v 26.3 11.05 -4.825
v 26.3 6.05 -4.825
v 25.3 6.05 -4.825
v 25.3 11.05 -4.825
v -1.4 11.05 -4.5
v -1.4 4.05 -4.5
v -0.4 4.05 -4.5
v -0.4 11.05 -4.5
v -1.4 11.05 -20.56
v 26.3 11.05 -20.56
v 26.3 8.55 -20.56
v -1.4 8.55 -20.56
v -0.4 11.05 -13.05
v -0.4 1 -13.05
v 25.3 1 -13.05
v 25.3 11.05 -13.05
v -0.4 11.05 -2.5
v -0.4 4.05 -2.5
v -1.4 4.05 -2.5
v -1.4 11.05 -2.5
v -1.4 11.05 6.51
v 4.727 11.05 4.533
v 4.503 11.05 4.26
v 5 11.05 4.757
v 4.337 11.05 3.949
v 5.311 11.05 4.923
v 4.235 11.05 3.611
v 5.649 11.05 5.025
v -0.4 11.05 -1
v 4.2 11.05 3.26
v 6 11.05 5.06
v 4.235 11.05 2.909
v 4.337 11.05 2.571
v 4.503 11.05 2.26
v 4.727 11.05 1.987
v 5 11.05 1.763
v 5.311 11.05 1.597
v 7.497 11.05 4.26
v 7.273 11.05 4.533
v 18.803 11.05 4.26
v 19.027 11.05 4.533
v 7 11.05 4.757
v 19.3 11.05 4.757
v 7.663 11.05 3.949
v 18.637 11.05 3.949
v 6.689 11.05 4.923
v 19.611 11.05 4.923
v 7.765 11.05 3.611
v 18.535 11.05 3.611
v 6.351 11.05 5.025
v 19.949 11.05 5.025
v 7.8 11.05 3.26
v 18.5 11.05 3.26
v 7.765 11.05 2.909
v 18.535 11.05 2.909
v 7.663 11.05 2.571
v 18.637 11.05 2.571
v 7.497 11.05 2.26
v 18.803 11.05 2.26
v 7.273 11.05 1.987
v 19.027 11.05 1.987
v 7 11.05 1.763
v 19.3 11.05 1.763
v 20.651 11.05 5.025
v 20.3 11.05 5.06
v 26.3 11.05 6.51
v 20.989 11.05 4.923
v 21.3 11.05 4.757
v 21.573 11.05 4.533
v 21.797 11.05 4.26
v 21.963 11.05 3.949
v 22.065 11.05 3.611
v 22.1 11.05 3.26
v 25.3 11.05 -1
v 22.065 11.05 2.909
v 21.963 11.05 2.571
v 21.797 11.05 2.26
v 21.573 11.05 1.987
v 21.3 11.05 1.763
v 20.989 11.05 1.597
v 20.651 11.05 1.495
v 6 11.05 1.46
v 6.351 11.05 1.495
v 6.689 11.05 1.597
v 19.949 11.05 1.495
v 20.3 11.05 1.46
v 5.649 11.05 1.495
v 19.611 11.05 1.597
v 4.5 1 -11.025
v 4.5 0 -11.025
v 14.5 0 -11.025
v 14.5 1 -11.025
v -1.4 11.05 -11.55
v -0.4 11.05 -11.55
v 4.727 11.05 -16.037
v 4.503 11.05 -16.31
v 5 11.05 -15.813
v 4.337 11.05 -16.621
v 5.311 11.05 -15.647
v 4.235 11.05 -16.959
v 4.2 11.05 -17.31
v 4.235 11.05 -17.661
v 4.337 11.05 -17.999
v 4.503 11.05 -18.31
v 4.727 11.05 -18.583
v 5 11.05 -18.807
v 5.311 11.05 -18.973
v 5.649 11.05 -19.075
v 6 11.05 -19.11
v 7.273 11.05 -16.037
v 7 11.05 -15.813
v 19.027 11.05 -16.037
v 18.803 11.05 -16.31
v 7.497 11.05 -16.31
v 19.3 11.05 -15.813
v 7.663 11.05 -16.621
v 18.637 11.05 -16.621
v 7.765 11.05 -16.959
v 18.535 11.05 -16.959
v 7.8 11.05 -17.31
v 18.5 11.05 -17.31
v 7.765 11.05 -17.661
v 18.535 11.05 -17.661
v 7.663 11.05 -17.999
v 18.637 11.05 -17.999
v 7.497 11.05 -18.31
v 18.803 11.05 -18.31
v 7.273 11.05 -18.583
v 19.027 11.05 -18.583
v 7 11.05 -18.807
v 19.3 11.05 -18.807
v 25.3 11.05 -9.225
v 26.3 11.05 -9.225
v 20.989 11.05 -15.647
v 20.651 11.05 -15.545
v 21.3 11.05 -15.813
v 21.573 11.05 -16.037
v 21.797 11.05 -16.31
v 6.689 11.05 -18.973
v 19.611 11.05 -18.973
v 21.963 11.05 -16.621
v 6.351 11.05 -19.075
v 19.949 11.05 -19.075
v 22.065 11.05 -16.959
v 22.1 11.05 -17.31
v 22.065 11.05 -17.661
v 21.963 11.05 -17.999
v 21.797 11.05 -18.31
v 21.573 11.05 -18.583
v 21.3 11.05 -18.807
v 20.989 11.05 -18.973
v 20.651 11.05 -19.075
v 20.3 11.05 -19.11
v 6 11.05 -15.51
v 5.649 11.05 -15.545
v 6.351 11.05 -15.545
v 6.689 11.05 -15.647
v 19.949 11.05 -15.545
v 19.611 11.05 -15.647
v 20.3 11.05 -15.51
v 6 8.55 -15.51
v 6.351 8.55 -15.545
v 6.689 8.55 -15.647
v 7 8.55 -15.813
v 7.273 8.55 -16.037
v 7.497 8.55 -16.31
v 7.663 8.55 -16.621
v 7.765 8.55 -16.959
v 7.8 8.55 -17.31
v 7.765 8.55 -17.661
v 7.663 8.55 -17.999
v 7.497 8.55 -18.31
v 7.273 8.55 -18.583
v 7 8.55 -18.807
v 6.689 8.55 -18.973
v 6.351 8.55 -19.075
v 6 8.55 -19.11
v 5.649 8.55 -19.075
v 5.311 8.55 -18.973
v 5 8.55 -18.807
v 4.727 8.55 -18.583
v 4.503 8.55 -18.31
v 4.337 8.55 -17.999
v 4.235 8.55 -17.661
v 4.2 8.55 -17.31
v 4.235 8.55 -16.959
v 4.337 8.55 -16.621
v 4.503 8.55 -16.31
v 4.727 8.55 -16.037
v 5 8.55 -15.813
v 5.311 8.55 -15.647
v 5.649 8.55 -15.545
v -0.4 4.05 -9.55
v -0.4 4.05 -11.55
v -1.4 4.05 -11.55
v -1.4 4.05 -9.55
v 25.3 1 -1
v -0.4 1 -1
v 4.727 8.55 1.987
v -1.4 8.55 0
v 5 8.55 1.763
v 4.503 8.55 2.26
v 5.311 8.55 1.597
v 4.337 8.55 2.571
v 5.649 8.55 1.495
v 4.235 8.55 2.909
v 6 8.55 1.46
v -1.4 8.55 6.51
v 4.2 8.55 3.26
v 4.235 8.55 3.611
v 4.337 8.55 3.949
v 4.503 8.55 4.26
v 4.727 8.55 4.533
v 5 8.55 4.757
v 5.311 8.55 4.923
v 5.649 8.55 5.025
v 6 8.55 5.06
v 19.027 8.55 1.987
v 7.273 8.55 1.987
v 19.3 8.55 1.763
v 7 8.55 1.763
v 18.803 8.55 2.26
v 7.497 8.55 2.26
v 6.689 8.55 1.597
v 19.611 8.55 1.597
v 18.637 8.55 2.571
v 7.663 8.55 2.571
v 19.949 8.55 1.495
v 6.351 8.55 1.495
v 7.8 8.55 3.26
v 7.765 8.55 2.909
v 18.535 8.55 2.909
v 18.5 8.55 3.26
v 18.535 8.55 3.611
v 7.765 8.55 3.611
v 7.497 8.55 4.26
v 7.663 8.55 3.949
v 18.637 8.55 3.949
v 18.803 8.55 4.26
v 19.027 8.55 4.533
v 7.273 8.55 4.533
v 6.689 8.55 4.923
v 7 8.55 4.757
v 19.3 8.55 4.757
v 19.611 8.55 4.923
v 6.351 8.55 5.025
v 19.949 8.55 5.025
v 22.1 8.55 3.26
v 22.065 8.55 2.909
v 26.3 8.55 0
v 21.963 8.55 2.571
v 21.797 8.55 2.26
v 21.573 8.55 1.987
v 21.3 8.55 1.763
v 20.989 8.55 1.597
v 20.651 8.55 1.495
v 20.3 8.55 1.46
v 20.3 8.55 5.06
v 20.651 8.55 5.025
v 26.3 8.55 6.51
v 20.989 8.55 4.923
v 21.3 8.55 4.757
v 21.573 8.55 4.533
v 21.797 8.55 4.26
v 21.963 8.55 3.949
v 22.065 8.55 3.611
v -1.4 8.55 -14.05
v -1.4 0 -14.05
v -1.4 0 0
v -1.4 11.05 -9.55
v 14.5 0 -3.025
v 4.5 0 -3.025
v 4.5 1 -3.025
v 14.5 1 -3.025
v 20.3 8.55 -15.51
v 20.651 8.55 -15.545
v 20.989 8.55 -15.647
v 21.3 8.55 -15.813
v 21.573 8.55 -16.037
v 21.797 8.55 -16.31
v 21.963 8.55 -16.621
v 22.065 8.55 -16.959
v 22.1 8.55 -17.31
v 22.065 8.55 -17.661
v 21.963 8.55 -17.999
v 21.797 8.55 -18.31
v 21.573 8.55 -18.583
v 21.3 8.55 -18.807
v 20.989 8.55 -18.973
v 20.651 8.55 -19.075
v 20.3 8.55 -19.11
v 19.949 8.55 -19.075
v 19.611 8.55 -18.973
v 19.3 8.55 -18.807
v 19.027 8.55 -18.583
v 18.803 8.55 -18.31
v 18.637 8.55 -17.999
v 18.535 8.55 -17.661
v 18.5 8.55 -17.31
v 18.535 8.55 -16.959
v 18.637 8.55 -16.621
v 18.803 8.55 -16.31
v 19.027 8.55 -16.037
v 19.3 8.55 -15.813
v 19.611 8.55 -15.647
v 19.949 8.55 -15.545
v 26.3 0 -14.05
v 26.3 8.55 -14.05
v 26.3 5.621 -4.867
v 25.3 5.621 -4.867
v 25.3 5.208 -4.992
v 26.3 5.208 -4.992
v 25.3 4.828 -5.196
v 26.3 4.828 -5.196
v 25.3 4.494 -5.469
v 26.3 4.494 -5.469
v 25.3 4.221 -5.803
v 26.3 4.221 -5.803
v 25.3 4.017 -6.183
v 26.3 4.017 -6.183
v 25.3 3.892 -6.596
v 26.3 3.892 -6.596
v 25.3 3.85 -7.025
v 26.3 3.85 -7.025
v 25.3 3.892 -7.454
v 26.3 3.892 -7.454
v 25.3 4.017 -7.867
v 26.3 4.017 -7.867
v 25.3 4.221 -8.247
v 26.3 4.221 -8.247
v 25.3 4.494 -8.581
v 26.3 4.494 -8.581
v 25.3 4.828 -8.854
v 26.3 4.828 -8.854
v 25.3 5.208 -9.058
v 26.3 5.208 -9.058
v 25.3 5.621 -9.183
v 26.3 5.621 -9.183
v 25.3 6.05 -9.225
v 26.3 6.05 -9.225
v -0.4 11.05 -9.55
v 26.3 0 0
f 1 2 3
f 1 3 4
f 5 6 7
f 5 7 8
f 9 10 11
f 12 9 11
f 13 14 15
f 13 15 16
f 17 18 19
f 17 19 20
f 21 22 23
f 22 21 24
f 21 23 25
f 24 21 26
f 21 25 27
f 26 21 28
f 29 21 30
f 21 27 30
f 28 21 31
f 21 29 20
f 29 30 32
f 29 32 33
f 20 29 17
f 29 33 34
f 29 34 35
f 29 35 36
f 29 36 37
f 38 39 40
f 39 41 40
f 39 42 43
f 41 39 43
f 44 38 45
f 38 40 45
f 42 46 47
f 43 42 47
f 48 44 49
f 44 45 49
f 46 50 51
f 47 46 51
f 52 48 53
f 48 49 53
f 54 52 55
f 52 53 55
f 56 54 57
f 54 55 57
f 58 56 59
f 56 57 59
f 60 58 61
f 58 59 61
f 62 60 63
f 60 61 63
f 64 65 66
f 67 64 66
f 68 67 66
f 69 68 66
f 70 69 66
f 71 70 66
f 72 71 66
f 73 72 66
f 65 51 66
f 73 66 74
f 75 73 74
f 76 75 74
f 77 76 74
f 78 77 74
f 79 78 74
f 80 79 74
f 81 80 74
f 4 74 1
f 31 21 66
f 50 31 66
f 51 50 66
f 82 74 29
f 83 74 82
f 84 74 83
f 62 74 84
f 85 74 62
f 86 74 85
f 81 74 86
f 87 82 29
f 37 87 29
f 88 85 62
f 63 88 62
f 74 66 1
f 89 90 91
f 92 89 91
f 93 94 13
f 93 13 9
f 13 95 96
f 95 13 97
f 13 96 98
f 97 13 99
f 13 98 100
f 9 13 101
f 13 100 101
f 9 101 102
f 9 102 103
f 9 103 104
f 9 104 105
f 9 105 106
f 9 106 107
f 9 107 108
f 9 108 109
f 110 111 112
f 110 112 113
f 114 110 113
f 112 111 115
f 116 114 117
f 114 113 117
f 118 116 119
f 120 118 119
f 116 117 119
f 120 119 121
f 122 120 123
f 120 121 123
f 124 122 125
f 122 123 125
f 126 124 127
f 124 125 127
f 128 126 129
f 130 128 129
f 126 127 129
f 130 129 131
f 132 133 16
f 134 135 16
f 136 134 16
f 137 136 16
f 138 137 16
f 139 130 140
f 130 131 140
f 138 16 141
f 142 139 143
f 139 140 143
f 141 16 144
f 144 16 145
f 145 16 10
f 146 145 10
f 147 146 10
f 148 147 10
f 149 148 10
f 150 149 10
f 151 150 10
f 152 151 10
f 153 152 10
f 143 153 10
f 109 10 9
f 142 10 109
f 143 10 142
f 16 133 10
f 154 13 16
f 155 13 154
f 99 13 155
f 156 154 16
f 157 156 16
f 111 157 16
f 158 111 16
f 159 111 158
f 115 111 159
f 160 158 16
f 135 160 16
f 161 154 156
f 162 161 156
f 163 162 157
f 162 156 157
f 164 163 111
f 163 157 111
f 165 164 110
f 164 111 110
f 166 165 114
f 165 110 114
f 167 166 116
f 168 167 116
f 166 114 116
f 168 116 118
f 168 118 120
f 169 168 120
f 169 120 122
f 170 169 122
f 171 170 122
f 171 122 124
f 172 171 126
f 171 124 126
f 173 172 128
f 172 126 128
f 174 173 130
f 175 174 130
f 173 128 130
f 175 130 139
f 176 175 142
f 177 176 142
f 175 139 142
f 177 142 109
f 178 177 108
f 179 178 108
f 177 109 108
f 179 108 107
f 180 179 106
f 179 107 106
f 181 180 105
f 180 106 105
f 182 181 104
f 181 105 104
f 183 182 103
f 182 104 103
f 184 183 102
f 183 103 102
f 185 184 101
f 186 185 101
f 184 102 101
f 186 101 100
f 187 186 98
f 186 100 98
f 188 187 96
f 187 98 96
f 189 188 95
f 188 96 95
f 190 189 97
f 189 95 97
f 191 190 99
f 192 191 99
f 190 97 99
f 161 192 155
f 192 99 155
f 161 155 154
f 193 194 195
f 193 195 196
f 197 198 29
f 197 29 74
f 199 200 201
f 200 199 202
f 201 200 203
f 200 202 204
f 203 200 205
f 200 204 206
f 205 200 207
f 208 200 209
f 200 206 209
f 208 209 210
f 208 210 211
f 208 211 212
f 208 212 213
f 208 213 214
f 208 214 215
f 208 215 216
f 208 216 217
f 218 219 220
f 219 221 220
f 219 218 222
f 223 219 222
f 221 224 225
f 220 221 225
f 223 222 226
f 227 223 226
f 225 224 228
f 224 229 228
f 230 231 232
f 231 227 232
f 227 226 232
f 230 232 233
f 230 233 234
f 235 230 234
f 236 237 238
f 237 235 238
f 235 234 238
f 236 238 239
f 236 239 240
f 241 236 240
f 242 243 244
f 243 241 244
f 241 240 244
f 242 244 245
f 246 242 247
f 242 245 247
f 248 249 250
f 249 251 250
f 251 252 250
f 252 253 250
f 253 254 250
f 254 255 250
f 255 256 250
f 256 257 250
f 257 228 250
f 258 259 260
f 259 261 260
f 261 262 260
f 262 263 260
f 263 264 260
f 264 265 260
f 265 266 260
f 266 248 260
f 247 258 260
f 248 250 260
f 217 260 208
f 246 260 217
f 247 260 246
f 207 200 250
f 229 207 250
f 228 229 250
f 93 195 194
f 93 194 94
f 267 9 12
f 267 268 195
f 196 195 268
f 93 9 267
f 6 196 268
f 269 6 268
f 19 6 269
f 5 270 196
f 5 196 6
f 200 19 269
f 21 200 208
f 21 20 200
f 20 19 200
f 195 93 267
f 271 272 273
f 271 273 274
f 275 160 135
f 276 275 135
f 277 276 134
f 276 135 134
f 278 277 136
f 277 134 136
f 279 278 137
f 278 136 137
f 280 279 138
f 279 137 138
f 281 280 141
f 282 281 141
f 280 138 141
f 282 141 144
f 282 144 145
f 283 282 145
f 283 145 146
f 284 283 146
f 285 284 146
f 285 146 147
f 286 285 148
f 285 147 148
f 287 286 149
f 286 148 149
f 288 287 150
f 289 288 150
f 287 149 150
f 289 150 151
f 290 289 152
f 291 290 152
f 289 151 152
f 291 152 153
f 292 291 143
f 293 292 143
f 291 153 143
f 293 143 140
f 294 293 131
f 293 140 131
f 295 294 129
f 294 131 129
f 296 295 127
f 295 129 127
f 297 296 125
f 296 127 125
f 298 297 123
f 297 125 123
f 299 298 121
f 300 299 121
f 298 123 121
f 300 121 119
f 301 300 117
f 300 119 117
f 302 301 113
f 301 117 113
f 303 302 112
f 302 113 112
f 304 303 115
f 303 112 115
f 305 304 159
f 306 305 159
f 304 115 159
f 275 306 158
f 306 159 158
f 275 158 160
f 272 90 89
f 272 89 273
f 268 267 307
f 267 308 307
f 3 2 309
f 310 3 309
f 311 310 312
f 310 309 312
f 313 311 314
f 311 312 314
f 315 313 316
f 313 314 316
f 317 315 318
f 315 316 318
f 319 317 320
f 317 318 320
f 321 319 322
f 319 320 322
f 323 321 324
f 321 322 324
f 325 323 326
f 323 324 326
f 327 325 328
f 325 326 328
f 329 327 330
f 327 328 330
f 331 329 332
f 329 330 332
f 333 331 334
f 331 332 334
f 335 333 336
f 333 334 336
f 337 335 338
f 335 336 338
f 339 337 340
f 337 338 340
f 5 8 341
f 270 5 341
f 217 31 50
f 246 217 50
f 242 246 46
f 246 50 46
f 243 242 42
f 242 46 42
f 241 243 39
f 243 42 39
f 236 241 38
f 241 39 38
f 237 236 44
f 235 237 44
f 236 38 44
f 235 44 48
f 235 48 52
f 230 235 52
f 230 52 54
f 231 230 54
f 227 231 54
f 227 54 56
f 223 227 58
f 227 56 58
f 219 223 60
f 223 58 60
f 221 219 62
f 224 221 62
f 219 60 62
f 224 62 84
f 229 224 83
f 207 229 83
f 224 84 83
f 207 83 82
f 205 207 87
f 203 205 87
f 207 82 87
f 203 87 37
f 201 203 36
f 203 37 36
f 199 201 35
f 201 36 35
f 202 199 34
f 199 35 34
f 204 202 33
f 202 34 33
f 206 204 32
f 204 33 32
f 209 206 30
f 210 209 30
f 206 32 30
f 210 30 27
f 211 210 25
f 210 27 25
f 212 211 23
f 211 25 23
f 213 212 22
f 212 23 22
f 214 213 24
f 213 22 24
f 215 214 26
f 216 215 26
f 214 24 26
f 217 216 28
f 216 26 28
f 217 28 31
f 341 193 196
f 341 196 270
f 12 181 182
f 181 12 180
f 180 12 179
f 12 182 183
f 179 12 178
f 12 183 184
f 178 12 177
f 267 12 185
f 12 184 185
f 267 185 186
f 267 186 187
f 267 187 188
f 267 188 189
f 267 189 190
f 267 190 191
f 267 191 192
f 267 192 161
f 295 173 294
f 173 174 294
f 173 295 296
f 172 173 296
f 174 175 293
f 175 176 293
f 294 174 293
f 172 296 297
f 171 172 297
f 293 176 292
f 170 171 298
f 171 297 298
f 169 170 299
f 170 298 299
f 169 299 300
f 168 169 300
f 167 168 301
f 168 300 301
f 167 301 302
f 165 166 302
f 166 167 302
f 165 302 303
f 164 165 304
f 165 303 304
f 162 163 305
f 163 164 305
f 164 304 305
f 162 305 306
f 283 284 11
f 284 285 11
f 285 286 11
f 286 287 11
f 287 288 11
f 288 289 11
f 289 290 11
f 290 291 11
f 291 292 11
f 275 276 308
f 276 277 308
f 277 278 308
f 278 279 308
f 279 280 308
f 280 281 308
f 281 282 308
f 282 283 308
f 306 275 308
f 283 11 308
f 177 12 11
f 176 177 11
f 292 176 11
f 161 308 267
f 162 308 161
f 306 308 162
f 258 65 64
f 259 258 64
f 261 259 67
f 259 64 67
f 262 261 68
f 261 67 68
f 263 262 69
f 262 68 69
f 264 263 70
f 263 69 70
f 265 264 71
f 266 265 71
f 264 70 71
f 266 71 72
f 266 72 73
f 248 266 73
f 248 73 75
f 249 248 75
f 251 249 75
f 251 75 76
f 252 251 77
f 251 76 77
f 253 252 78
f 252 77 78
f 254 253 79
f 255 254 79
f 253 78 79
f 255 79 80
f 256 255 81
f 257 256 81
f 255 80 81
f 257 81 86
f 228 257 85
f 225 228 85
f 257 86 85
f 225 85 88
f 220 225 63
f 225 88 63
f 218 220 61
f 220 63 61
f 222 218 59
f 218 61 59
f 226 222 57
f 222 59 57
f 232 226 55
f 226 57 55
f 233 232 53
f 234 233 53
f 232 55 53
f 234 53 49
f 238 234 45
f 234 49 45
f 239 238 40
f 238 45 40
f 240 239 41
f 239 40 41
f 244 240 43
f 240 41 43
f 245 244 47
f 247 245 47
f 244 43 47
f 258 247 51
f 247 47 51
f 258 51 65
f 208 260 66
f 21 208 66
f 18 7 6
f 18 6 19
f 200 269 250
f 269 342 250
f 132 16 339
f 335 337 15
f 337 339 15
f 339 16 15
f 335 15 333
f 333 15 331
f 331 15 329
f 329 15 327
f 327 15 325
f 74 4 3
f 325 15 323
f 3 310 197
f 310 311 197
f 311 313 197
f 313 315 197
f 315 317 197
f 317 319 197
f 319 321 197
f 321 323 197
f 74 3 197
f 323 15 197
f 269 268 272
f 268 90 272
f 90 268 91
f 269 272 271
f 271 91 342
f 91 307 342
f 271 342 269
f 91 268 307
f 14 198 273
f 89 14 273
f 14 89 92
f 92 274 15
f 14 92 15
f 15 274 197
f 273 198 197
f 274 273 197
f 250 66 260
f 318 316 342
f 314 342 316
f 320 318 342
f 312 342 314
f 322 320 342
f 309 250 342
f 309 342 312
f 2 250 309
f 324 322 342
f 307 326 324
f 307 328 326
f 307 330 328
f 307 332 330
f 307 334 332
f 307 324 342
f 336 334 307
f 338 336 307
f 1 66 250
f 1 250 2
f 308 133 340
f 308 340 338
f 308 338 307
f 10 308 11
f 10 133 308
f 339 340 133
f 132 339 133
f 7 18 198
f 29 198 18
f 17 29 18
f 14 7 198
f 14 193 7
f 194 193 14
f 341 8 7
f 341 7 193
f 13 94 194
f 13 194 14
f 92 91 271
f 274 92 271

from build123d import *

# Parameters (mm, degrees)
SKETCH1_W            = 26.3
SKETCH1_H            = 14.05
BOSS_EXTRUDE6_DEPTH  = 1
SKETCH5_W            = 24.3
SKETCH5_H            = 1
BOSS_EXTRUDE8_DEPTH  = 10.05
SKETCH6_W            = 26.3
SKETCH6_H            = 27.07
SKETCH6_W_2          = 24.3
SKETCH6_H_2          = 12.05
BOSS_EXTRUDE9_DEPTH  = 2.5
SKETCH7_R            = 1.8
CUT_EXTRUDE1_DEPTH   = 2.5
SKETCH8_W            = 4.4
SKETCH8_H            = 5
CUT_EXTRUDE2_DEPTH   = 2.5
CUT_EXTRUDE3_DEPTH   = 2.5
SKETCH10_W           = 12
SKETCH10_H           = 8
CUT_EXTRUDE5_DEPTH   = 2.5
SKETCH11_W           = 2
SKETCH11_H           = 7
CUT_EXTRUDE7_DEPTH   = 2.5
SKETCH12_W           = 2
SKETCH12_H           = 3
BOSS_EXTRUDE11_DEPTH = 1
SKETCH13_W           = 2
SKETCH13_H           = 8
BOSS_EXTRUDE14_DEPTH = 1
SKETCH14_W           = 2
SKETCH14_H           = 4
BOSS_EXTRUDE15_DEPTH = 1.4
SKETCH15_W           = 12.05
SKETCH15_H           = 10.05
CUT_EXTRUDE8_DEPTH   = 1.4
SKETCH16_W           = 2
SKETCH16_H           = 3
CUT_EXTRUDE9_DEPTH   = 1.4


with BuildPart() as part:
    # Sketch1 → Boss-Extrude6 (new body)
    with BuildSketch(Plane(origin=(0, 0, 0), x_dir=(1, 0, 0), z_dir=(0, 1, 0))):
        with Locations((13.15, 7.025)):
            Rectangle(SKETCH1_W, SKETCH1_H)
    extrude(amount=BOSS_EXTRUDE6_DEPTH)

    # Sketch5 → Boss-Extrude8 (add)
    with BuildSketch(Plane(origin=(0, 1, 0), x_dir=(1, 0, 0), z_dir=(0, 1, 0))):
        with Locations((13.15, 13.55)):
            Rectangle(SKETCH5_W, SKETCH5_H)
        Polygon((26.3, 14.05), (25.3, 14.05), (25.3, 13.05), (25.3, 1), (25.3, 0), (26.3, 0), align=None)
        with Locations((13.15, 0.5)):
            Rectangle(SKETCH5_W, SKETCH5_H)
        Polygon((1, 14.05), (0, 14.05), (0, 0), (1, 0), (1, 1), (1, 13.05), align=None)
    extrude(amount=BOSS_EXTRUDE8_DEPTH)

    # Sketch6 → Boss-Extrude9 (add)
    with BuildSketch(Plane(origin=(0, 11.05, 0), x_dir=(1, 0, 0), z_dir=(0, 1, 0))):
        with Locations((13.15, 7.025)):
            Rectangle(SKETCH6_W, SKETCH6_H)
        with Locations((13.15, 7.025)):
            Rectangle(SKETCH6_W_2, SKETCH6_H_2, mode=Mode.SUBTRACT)
    extrude(amount=-BOSS_EXTRUDE9_DEPTH)

    # Sketch7 → Cut-Extrude1 (cut)
    with BuildSketch(Plane(origin=(0, 11.05, 0), x_dir=(1, 0, 0), z_dir=(0, 1, 0))):
        with Locations(Location((6, -3.26, 0), (0, 0, 270))):
            Circle(SKETCH7_R)
        with Locations(Location((20.3, -3.26, 0), (0, 0, 270))):
            Circle(SKETCH7_R)
        with Locations(Location((6, 17.31, 0), (0, 0, 270))):
            Circle(SKETCH7_R)
        with Locations(Location((20.3, 17.31, 0), (0, 0, 270))):
            Circle(SKETCH7_R)
    extrude(amount=-CUT_EXTRUDE1_DEPTH, mode=Mode.SUBTRACT)

    # Sketch8 → Cut-Extrude2 (cut)
    with BuildSketch(Plane(origin=(26.3, 0, 0), x_dir=(0, 0, -1), z_dir=(1, 0, 0))):
        with Locations((7.025, 8.55)):
            Rectangle(SKETCH8_W, SKETCH8_H)
    extrude(amount=-CUT_EXTRUDE2_DEPTH, mode=Mode.SUBTRACT)

    # Sketch9 → Cut-Extrude3 (cut)
    with BuildSketch(Plane(origin=(26.3, 0, 0), x_dir=(0, 0, -1), z_dir=(1, 0, 0))):
        with BuildLine():
            Line((9.225, 6.05), (4.825, 6.05))
            ThreePointArc((4.825, 6.05), (7.025, 3.85), (9.225, 6.05))
        make_face()
    extrude(amount=-CUT_EXTRUDE3_DEPTH, mode=Mode.SUBTRACT)

    # Sketch10 → Cut-Extrude5 (cut)
    with BuildSketch(Plane.XZ):
        with Locations((8.5, -7.025)):
            Rectangle(SKETCH10_W, SKETCH10_H)
    extrude(amount=-CUT_EXTRUDE5_DEPTH, mode=Mode.SUBTRACT)

    # Sketch11 → Cut-Extrude7 (cut)
    with BuildSketch(Plane.ZY):
        with Locations((-3.5, 7.55)):
            Rectangle(SKETCH11_W, SKETCH11_H)
        with Locations((-10.55, 7.55)):
            Rectangle(SKETCH11_W, SKETCH11_H)
    extrude(amount=-CUT_EXTRUDE7_DEPTH, mode=Mode.SUBTRACT)

    # Sketch12 → Boss-Extrude11 (add)
    with BuildSketch(Plane.ZY):
        with Locations((-3.5, 9.55)):
            Rectangle(SKETCH12_W, SKETCH12_H)
        with Locations((-10.55, 9.55)):
            Rectangle(SKETCH12_W, SKETCH12_H)
    extrude(amount=-BOSS_EXTRUDE11_DEPTH)

    # Sketch13 → Boss-Extrude14 (add)
    with BuildSketch(Plane.XZ):
        with Locations((3.5, -7.025)):
            Rectangle(SKETCH13_W, SKETCH13_H)
    extrude(amount=-BOSS_EXTRUDE14_DEPTH)

    # Sketch14 → Boss-Extrude15 (add)
    with BuildSketch(Plane.ZY):
        Polygon((-20.56, 8.55), (-14.05, 8.55), (-14.05, 0), (0, 0), (0, 8.55), (6.51, 8.55), (6.51, 11.05), (-20.56, 11.05), align=None)
        with Locations((-10.55, 6.05)):
            Rectangle(SKETCH14_W, SKETCH14_H, mode=Mode.SUBTRACT)
        with Locations((-3.5, 6.05)):
            Rectangle(SKETCH14_W, SKETCH14_H, mode=Mode.SUBTRACT)
    extrude(amount=BOSS_EXTRUDE15_DEPTH)

    # Sketch15 → Cut-Extrude8 (cut)
    with BuildSketch(Plane(origin=(1, 0, 0), x_dir=(0, 0, -1), z_dir=(1, 0, 0))):
        with Locations((7.025, 6.025)):
            Rectangle(SKETCH15_W, SKETCH15_H)
    extrude(amount=-CUT_EXTRUDE8_DEPTH, mode=Mode.SUBTRACT)

    # Sketch16 → Cut-Extrude9 (cut)
    with BuildSketch(Plane.ZY.offset(1.4)):
        with Locations((-10.55, 9.55)):
            Rectangle(SKETCH16_W, SKETCH16_H)
        with Locations((-3.5, 9.55)):
            Rectangle(SKETCH16_W, SKETCH16_H)
    extrude(amount=-CUT_EXTRUDE9_DEPTH, mode=Mode.SUBTRACT)


solid = part.part
